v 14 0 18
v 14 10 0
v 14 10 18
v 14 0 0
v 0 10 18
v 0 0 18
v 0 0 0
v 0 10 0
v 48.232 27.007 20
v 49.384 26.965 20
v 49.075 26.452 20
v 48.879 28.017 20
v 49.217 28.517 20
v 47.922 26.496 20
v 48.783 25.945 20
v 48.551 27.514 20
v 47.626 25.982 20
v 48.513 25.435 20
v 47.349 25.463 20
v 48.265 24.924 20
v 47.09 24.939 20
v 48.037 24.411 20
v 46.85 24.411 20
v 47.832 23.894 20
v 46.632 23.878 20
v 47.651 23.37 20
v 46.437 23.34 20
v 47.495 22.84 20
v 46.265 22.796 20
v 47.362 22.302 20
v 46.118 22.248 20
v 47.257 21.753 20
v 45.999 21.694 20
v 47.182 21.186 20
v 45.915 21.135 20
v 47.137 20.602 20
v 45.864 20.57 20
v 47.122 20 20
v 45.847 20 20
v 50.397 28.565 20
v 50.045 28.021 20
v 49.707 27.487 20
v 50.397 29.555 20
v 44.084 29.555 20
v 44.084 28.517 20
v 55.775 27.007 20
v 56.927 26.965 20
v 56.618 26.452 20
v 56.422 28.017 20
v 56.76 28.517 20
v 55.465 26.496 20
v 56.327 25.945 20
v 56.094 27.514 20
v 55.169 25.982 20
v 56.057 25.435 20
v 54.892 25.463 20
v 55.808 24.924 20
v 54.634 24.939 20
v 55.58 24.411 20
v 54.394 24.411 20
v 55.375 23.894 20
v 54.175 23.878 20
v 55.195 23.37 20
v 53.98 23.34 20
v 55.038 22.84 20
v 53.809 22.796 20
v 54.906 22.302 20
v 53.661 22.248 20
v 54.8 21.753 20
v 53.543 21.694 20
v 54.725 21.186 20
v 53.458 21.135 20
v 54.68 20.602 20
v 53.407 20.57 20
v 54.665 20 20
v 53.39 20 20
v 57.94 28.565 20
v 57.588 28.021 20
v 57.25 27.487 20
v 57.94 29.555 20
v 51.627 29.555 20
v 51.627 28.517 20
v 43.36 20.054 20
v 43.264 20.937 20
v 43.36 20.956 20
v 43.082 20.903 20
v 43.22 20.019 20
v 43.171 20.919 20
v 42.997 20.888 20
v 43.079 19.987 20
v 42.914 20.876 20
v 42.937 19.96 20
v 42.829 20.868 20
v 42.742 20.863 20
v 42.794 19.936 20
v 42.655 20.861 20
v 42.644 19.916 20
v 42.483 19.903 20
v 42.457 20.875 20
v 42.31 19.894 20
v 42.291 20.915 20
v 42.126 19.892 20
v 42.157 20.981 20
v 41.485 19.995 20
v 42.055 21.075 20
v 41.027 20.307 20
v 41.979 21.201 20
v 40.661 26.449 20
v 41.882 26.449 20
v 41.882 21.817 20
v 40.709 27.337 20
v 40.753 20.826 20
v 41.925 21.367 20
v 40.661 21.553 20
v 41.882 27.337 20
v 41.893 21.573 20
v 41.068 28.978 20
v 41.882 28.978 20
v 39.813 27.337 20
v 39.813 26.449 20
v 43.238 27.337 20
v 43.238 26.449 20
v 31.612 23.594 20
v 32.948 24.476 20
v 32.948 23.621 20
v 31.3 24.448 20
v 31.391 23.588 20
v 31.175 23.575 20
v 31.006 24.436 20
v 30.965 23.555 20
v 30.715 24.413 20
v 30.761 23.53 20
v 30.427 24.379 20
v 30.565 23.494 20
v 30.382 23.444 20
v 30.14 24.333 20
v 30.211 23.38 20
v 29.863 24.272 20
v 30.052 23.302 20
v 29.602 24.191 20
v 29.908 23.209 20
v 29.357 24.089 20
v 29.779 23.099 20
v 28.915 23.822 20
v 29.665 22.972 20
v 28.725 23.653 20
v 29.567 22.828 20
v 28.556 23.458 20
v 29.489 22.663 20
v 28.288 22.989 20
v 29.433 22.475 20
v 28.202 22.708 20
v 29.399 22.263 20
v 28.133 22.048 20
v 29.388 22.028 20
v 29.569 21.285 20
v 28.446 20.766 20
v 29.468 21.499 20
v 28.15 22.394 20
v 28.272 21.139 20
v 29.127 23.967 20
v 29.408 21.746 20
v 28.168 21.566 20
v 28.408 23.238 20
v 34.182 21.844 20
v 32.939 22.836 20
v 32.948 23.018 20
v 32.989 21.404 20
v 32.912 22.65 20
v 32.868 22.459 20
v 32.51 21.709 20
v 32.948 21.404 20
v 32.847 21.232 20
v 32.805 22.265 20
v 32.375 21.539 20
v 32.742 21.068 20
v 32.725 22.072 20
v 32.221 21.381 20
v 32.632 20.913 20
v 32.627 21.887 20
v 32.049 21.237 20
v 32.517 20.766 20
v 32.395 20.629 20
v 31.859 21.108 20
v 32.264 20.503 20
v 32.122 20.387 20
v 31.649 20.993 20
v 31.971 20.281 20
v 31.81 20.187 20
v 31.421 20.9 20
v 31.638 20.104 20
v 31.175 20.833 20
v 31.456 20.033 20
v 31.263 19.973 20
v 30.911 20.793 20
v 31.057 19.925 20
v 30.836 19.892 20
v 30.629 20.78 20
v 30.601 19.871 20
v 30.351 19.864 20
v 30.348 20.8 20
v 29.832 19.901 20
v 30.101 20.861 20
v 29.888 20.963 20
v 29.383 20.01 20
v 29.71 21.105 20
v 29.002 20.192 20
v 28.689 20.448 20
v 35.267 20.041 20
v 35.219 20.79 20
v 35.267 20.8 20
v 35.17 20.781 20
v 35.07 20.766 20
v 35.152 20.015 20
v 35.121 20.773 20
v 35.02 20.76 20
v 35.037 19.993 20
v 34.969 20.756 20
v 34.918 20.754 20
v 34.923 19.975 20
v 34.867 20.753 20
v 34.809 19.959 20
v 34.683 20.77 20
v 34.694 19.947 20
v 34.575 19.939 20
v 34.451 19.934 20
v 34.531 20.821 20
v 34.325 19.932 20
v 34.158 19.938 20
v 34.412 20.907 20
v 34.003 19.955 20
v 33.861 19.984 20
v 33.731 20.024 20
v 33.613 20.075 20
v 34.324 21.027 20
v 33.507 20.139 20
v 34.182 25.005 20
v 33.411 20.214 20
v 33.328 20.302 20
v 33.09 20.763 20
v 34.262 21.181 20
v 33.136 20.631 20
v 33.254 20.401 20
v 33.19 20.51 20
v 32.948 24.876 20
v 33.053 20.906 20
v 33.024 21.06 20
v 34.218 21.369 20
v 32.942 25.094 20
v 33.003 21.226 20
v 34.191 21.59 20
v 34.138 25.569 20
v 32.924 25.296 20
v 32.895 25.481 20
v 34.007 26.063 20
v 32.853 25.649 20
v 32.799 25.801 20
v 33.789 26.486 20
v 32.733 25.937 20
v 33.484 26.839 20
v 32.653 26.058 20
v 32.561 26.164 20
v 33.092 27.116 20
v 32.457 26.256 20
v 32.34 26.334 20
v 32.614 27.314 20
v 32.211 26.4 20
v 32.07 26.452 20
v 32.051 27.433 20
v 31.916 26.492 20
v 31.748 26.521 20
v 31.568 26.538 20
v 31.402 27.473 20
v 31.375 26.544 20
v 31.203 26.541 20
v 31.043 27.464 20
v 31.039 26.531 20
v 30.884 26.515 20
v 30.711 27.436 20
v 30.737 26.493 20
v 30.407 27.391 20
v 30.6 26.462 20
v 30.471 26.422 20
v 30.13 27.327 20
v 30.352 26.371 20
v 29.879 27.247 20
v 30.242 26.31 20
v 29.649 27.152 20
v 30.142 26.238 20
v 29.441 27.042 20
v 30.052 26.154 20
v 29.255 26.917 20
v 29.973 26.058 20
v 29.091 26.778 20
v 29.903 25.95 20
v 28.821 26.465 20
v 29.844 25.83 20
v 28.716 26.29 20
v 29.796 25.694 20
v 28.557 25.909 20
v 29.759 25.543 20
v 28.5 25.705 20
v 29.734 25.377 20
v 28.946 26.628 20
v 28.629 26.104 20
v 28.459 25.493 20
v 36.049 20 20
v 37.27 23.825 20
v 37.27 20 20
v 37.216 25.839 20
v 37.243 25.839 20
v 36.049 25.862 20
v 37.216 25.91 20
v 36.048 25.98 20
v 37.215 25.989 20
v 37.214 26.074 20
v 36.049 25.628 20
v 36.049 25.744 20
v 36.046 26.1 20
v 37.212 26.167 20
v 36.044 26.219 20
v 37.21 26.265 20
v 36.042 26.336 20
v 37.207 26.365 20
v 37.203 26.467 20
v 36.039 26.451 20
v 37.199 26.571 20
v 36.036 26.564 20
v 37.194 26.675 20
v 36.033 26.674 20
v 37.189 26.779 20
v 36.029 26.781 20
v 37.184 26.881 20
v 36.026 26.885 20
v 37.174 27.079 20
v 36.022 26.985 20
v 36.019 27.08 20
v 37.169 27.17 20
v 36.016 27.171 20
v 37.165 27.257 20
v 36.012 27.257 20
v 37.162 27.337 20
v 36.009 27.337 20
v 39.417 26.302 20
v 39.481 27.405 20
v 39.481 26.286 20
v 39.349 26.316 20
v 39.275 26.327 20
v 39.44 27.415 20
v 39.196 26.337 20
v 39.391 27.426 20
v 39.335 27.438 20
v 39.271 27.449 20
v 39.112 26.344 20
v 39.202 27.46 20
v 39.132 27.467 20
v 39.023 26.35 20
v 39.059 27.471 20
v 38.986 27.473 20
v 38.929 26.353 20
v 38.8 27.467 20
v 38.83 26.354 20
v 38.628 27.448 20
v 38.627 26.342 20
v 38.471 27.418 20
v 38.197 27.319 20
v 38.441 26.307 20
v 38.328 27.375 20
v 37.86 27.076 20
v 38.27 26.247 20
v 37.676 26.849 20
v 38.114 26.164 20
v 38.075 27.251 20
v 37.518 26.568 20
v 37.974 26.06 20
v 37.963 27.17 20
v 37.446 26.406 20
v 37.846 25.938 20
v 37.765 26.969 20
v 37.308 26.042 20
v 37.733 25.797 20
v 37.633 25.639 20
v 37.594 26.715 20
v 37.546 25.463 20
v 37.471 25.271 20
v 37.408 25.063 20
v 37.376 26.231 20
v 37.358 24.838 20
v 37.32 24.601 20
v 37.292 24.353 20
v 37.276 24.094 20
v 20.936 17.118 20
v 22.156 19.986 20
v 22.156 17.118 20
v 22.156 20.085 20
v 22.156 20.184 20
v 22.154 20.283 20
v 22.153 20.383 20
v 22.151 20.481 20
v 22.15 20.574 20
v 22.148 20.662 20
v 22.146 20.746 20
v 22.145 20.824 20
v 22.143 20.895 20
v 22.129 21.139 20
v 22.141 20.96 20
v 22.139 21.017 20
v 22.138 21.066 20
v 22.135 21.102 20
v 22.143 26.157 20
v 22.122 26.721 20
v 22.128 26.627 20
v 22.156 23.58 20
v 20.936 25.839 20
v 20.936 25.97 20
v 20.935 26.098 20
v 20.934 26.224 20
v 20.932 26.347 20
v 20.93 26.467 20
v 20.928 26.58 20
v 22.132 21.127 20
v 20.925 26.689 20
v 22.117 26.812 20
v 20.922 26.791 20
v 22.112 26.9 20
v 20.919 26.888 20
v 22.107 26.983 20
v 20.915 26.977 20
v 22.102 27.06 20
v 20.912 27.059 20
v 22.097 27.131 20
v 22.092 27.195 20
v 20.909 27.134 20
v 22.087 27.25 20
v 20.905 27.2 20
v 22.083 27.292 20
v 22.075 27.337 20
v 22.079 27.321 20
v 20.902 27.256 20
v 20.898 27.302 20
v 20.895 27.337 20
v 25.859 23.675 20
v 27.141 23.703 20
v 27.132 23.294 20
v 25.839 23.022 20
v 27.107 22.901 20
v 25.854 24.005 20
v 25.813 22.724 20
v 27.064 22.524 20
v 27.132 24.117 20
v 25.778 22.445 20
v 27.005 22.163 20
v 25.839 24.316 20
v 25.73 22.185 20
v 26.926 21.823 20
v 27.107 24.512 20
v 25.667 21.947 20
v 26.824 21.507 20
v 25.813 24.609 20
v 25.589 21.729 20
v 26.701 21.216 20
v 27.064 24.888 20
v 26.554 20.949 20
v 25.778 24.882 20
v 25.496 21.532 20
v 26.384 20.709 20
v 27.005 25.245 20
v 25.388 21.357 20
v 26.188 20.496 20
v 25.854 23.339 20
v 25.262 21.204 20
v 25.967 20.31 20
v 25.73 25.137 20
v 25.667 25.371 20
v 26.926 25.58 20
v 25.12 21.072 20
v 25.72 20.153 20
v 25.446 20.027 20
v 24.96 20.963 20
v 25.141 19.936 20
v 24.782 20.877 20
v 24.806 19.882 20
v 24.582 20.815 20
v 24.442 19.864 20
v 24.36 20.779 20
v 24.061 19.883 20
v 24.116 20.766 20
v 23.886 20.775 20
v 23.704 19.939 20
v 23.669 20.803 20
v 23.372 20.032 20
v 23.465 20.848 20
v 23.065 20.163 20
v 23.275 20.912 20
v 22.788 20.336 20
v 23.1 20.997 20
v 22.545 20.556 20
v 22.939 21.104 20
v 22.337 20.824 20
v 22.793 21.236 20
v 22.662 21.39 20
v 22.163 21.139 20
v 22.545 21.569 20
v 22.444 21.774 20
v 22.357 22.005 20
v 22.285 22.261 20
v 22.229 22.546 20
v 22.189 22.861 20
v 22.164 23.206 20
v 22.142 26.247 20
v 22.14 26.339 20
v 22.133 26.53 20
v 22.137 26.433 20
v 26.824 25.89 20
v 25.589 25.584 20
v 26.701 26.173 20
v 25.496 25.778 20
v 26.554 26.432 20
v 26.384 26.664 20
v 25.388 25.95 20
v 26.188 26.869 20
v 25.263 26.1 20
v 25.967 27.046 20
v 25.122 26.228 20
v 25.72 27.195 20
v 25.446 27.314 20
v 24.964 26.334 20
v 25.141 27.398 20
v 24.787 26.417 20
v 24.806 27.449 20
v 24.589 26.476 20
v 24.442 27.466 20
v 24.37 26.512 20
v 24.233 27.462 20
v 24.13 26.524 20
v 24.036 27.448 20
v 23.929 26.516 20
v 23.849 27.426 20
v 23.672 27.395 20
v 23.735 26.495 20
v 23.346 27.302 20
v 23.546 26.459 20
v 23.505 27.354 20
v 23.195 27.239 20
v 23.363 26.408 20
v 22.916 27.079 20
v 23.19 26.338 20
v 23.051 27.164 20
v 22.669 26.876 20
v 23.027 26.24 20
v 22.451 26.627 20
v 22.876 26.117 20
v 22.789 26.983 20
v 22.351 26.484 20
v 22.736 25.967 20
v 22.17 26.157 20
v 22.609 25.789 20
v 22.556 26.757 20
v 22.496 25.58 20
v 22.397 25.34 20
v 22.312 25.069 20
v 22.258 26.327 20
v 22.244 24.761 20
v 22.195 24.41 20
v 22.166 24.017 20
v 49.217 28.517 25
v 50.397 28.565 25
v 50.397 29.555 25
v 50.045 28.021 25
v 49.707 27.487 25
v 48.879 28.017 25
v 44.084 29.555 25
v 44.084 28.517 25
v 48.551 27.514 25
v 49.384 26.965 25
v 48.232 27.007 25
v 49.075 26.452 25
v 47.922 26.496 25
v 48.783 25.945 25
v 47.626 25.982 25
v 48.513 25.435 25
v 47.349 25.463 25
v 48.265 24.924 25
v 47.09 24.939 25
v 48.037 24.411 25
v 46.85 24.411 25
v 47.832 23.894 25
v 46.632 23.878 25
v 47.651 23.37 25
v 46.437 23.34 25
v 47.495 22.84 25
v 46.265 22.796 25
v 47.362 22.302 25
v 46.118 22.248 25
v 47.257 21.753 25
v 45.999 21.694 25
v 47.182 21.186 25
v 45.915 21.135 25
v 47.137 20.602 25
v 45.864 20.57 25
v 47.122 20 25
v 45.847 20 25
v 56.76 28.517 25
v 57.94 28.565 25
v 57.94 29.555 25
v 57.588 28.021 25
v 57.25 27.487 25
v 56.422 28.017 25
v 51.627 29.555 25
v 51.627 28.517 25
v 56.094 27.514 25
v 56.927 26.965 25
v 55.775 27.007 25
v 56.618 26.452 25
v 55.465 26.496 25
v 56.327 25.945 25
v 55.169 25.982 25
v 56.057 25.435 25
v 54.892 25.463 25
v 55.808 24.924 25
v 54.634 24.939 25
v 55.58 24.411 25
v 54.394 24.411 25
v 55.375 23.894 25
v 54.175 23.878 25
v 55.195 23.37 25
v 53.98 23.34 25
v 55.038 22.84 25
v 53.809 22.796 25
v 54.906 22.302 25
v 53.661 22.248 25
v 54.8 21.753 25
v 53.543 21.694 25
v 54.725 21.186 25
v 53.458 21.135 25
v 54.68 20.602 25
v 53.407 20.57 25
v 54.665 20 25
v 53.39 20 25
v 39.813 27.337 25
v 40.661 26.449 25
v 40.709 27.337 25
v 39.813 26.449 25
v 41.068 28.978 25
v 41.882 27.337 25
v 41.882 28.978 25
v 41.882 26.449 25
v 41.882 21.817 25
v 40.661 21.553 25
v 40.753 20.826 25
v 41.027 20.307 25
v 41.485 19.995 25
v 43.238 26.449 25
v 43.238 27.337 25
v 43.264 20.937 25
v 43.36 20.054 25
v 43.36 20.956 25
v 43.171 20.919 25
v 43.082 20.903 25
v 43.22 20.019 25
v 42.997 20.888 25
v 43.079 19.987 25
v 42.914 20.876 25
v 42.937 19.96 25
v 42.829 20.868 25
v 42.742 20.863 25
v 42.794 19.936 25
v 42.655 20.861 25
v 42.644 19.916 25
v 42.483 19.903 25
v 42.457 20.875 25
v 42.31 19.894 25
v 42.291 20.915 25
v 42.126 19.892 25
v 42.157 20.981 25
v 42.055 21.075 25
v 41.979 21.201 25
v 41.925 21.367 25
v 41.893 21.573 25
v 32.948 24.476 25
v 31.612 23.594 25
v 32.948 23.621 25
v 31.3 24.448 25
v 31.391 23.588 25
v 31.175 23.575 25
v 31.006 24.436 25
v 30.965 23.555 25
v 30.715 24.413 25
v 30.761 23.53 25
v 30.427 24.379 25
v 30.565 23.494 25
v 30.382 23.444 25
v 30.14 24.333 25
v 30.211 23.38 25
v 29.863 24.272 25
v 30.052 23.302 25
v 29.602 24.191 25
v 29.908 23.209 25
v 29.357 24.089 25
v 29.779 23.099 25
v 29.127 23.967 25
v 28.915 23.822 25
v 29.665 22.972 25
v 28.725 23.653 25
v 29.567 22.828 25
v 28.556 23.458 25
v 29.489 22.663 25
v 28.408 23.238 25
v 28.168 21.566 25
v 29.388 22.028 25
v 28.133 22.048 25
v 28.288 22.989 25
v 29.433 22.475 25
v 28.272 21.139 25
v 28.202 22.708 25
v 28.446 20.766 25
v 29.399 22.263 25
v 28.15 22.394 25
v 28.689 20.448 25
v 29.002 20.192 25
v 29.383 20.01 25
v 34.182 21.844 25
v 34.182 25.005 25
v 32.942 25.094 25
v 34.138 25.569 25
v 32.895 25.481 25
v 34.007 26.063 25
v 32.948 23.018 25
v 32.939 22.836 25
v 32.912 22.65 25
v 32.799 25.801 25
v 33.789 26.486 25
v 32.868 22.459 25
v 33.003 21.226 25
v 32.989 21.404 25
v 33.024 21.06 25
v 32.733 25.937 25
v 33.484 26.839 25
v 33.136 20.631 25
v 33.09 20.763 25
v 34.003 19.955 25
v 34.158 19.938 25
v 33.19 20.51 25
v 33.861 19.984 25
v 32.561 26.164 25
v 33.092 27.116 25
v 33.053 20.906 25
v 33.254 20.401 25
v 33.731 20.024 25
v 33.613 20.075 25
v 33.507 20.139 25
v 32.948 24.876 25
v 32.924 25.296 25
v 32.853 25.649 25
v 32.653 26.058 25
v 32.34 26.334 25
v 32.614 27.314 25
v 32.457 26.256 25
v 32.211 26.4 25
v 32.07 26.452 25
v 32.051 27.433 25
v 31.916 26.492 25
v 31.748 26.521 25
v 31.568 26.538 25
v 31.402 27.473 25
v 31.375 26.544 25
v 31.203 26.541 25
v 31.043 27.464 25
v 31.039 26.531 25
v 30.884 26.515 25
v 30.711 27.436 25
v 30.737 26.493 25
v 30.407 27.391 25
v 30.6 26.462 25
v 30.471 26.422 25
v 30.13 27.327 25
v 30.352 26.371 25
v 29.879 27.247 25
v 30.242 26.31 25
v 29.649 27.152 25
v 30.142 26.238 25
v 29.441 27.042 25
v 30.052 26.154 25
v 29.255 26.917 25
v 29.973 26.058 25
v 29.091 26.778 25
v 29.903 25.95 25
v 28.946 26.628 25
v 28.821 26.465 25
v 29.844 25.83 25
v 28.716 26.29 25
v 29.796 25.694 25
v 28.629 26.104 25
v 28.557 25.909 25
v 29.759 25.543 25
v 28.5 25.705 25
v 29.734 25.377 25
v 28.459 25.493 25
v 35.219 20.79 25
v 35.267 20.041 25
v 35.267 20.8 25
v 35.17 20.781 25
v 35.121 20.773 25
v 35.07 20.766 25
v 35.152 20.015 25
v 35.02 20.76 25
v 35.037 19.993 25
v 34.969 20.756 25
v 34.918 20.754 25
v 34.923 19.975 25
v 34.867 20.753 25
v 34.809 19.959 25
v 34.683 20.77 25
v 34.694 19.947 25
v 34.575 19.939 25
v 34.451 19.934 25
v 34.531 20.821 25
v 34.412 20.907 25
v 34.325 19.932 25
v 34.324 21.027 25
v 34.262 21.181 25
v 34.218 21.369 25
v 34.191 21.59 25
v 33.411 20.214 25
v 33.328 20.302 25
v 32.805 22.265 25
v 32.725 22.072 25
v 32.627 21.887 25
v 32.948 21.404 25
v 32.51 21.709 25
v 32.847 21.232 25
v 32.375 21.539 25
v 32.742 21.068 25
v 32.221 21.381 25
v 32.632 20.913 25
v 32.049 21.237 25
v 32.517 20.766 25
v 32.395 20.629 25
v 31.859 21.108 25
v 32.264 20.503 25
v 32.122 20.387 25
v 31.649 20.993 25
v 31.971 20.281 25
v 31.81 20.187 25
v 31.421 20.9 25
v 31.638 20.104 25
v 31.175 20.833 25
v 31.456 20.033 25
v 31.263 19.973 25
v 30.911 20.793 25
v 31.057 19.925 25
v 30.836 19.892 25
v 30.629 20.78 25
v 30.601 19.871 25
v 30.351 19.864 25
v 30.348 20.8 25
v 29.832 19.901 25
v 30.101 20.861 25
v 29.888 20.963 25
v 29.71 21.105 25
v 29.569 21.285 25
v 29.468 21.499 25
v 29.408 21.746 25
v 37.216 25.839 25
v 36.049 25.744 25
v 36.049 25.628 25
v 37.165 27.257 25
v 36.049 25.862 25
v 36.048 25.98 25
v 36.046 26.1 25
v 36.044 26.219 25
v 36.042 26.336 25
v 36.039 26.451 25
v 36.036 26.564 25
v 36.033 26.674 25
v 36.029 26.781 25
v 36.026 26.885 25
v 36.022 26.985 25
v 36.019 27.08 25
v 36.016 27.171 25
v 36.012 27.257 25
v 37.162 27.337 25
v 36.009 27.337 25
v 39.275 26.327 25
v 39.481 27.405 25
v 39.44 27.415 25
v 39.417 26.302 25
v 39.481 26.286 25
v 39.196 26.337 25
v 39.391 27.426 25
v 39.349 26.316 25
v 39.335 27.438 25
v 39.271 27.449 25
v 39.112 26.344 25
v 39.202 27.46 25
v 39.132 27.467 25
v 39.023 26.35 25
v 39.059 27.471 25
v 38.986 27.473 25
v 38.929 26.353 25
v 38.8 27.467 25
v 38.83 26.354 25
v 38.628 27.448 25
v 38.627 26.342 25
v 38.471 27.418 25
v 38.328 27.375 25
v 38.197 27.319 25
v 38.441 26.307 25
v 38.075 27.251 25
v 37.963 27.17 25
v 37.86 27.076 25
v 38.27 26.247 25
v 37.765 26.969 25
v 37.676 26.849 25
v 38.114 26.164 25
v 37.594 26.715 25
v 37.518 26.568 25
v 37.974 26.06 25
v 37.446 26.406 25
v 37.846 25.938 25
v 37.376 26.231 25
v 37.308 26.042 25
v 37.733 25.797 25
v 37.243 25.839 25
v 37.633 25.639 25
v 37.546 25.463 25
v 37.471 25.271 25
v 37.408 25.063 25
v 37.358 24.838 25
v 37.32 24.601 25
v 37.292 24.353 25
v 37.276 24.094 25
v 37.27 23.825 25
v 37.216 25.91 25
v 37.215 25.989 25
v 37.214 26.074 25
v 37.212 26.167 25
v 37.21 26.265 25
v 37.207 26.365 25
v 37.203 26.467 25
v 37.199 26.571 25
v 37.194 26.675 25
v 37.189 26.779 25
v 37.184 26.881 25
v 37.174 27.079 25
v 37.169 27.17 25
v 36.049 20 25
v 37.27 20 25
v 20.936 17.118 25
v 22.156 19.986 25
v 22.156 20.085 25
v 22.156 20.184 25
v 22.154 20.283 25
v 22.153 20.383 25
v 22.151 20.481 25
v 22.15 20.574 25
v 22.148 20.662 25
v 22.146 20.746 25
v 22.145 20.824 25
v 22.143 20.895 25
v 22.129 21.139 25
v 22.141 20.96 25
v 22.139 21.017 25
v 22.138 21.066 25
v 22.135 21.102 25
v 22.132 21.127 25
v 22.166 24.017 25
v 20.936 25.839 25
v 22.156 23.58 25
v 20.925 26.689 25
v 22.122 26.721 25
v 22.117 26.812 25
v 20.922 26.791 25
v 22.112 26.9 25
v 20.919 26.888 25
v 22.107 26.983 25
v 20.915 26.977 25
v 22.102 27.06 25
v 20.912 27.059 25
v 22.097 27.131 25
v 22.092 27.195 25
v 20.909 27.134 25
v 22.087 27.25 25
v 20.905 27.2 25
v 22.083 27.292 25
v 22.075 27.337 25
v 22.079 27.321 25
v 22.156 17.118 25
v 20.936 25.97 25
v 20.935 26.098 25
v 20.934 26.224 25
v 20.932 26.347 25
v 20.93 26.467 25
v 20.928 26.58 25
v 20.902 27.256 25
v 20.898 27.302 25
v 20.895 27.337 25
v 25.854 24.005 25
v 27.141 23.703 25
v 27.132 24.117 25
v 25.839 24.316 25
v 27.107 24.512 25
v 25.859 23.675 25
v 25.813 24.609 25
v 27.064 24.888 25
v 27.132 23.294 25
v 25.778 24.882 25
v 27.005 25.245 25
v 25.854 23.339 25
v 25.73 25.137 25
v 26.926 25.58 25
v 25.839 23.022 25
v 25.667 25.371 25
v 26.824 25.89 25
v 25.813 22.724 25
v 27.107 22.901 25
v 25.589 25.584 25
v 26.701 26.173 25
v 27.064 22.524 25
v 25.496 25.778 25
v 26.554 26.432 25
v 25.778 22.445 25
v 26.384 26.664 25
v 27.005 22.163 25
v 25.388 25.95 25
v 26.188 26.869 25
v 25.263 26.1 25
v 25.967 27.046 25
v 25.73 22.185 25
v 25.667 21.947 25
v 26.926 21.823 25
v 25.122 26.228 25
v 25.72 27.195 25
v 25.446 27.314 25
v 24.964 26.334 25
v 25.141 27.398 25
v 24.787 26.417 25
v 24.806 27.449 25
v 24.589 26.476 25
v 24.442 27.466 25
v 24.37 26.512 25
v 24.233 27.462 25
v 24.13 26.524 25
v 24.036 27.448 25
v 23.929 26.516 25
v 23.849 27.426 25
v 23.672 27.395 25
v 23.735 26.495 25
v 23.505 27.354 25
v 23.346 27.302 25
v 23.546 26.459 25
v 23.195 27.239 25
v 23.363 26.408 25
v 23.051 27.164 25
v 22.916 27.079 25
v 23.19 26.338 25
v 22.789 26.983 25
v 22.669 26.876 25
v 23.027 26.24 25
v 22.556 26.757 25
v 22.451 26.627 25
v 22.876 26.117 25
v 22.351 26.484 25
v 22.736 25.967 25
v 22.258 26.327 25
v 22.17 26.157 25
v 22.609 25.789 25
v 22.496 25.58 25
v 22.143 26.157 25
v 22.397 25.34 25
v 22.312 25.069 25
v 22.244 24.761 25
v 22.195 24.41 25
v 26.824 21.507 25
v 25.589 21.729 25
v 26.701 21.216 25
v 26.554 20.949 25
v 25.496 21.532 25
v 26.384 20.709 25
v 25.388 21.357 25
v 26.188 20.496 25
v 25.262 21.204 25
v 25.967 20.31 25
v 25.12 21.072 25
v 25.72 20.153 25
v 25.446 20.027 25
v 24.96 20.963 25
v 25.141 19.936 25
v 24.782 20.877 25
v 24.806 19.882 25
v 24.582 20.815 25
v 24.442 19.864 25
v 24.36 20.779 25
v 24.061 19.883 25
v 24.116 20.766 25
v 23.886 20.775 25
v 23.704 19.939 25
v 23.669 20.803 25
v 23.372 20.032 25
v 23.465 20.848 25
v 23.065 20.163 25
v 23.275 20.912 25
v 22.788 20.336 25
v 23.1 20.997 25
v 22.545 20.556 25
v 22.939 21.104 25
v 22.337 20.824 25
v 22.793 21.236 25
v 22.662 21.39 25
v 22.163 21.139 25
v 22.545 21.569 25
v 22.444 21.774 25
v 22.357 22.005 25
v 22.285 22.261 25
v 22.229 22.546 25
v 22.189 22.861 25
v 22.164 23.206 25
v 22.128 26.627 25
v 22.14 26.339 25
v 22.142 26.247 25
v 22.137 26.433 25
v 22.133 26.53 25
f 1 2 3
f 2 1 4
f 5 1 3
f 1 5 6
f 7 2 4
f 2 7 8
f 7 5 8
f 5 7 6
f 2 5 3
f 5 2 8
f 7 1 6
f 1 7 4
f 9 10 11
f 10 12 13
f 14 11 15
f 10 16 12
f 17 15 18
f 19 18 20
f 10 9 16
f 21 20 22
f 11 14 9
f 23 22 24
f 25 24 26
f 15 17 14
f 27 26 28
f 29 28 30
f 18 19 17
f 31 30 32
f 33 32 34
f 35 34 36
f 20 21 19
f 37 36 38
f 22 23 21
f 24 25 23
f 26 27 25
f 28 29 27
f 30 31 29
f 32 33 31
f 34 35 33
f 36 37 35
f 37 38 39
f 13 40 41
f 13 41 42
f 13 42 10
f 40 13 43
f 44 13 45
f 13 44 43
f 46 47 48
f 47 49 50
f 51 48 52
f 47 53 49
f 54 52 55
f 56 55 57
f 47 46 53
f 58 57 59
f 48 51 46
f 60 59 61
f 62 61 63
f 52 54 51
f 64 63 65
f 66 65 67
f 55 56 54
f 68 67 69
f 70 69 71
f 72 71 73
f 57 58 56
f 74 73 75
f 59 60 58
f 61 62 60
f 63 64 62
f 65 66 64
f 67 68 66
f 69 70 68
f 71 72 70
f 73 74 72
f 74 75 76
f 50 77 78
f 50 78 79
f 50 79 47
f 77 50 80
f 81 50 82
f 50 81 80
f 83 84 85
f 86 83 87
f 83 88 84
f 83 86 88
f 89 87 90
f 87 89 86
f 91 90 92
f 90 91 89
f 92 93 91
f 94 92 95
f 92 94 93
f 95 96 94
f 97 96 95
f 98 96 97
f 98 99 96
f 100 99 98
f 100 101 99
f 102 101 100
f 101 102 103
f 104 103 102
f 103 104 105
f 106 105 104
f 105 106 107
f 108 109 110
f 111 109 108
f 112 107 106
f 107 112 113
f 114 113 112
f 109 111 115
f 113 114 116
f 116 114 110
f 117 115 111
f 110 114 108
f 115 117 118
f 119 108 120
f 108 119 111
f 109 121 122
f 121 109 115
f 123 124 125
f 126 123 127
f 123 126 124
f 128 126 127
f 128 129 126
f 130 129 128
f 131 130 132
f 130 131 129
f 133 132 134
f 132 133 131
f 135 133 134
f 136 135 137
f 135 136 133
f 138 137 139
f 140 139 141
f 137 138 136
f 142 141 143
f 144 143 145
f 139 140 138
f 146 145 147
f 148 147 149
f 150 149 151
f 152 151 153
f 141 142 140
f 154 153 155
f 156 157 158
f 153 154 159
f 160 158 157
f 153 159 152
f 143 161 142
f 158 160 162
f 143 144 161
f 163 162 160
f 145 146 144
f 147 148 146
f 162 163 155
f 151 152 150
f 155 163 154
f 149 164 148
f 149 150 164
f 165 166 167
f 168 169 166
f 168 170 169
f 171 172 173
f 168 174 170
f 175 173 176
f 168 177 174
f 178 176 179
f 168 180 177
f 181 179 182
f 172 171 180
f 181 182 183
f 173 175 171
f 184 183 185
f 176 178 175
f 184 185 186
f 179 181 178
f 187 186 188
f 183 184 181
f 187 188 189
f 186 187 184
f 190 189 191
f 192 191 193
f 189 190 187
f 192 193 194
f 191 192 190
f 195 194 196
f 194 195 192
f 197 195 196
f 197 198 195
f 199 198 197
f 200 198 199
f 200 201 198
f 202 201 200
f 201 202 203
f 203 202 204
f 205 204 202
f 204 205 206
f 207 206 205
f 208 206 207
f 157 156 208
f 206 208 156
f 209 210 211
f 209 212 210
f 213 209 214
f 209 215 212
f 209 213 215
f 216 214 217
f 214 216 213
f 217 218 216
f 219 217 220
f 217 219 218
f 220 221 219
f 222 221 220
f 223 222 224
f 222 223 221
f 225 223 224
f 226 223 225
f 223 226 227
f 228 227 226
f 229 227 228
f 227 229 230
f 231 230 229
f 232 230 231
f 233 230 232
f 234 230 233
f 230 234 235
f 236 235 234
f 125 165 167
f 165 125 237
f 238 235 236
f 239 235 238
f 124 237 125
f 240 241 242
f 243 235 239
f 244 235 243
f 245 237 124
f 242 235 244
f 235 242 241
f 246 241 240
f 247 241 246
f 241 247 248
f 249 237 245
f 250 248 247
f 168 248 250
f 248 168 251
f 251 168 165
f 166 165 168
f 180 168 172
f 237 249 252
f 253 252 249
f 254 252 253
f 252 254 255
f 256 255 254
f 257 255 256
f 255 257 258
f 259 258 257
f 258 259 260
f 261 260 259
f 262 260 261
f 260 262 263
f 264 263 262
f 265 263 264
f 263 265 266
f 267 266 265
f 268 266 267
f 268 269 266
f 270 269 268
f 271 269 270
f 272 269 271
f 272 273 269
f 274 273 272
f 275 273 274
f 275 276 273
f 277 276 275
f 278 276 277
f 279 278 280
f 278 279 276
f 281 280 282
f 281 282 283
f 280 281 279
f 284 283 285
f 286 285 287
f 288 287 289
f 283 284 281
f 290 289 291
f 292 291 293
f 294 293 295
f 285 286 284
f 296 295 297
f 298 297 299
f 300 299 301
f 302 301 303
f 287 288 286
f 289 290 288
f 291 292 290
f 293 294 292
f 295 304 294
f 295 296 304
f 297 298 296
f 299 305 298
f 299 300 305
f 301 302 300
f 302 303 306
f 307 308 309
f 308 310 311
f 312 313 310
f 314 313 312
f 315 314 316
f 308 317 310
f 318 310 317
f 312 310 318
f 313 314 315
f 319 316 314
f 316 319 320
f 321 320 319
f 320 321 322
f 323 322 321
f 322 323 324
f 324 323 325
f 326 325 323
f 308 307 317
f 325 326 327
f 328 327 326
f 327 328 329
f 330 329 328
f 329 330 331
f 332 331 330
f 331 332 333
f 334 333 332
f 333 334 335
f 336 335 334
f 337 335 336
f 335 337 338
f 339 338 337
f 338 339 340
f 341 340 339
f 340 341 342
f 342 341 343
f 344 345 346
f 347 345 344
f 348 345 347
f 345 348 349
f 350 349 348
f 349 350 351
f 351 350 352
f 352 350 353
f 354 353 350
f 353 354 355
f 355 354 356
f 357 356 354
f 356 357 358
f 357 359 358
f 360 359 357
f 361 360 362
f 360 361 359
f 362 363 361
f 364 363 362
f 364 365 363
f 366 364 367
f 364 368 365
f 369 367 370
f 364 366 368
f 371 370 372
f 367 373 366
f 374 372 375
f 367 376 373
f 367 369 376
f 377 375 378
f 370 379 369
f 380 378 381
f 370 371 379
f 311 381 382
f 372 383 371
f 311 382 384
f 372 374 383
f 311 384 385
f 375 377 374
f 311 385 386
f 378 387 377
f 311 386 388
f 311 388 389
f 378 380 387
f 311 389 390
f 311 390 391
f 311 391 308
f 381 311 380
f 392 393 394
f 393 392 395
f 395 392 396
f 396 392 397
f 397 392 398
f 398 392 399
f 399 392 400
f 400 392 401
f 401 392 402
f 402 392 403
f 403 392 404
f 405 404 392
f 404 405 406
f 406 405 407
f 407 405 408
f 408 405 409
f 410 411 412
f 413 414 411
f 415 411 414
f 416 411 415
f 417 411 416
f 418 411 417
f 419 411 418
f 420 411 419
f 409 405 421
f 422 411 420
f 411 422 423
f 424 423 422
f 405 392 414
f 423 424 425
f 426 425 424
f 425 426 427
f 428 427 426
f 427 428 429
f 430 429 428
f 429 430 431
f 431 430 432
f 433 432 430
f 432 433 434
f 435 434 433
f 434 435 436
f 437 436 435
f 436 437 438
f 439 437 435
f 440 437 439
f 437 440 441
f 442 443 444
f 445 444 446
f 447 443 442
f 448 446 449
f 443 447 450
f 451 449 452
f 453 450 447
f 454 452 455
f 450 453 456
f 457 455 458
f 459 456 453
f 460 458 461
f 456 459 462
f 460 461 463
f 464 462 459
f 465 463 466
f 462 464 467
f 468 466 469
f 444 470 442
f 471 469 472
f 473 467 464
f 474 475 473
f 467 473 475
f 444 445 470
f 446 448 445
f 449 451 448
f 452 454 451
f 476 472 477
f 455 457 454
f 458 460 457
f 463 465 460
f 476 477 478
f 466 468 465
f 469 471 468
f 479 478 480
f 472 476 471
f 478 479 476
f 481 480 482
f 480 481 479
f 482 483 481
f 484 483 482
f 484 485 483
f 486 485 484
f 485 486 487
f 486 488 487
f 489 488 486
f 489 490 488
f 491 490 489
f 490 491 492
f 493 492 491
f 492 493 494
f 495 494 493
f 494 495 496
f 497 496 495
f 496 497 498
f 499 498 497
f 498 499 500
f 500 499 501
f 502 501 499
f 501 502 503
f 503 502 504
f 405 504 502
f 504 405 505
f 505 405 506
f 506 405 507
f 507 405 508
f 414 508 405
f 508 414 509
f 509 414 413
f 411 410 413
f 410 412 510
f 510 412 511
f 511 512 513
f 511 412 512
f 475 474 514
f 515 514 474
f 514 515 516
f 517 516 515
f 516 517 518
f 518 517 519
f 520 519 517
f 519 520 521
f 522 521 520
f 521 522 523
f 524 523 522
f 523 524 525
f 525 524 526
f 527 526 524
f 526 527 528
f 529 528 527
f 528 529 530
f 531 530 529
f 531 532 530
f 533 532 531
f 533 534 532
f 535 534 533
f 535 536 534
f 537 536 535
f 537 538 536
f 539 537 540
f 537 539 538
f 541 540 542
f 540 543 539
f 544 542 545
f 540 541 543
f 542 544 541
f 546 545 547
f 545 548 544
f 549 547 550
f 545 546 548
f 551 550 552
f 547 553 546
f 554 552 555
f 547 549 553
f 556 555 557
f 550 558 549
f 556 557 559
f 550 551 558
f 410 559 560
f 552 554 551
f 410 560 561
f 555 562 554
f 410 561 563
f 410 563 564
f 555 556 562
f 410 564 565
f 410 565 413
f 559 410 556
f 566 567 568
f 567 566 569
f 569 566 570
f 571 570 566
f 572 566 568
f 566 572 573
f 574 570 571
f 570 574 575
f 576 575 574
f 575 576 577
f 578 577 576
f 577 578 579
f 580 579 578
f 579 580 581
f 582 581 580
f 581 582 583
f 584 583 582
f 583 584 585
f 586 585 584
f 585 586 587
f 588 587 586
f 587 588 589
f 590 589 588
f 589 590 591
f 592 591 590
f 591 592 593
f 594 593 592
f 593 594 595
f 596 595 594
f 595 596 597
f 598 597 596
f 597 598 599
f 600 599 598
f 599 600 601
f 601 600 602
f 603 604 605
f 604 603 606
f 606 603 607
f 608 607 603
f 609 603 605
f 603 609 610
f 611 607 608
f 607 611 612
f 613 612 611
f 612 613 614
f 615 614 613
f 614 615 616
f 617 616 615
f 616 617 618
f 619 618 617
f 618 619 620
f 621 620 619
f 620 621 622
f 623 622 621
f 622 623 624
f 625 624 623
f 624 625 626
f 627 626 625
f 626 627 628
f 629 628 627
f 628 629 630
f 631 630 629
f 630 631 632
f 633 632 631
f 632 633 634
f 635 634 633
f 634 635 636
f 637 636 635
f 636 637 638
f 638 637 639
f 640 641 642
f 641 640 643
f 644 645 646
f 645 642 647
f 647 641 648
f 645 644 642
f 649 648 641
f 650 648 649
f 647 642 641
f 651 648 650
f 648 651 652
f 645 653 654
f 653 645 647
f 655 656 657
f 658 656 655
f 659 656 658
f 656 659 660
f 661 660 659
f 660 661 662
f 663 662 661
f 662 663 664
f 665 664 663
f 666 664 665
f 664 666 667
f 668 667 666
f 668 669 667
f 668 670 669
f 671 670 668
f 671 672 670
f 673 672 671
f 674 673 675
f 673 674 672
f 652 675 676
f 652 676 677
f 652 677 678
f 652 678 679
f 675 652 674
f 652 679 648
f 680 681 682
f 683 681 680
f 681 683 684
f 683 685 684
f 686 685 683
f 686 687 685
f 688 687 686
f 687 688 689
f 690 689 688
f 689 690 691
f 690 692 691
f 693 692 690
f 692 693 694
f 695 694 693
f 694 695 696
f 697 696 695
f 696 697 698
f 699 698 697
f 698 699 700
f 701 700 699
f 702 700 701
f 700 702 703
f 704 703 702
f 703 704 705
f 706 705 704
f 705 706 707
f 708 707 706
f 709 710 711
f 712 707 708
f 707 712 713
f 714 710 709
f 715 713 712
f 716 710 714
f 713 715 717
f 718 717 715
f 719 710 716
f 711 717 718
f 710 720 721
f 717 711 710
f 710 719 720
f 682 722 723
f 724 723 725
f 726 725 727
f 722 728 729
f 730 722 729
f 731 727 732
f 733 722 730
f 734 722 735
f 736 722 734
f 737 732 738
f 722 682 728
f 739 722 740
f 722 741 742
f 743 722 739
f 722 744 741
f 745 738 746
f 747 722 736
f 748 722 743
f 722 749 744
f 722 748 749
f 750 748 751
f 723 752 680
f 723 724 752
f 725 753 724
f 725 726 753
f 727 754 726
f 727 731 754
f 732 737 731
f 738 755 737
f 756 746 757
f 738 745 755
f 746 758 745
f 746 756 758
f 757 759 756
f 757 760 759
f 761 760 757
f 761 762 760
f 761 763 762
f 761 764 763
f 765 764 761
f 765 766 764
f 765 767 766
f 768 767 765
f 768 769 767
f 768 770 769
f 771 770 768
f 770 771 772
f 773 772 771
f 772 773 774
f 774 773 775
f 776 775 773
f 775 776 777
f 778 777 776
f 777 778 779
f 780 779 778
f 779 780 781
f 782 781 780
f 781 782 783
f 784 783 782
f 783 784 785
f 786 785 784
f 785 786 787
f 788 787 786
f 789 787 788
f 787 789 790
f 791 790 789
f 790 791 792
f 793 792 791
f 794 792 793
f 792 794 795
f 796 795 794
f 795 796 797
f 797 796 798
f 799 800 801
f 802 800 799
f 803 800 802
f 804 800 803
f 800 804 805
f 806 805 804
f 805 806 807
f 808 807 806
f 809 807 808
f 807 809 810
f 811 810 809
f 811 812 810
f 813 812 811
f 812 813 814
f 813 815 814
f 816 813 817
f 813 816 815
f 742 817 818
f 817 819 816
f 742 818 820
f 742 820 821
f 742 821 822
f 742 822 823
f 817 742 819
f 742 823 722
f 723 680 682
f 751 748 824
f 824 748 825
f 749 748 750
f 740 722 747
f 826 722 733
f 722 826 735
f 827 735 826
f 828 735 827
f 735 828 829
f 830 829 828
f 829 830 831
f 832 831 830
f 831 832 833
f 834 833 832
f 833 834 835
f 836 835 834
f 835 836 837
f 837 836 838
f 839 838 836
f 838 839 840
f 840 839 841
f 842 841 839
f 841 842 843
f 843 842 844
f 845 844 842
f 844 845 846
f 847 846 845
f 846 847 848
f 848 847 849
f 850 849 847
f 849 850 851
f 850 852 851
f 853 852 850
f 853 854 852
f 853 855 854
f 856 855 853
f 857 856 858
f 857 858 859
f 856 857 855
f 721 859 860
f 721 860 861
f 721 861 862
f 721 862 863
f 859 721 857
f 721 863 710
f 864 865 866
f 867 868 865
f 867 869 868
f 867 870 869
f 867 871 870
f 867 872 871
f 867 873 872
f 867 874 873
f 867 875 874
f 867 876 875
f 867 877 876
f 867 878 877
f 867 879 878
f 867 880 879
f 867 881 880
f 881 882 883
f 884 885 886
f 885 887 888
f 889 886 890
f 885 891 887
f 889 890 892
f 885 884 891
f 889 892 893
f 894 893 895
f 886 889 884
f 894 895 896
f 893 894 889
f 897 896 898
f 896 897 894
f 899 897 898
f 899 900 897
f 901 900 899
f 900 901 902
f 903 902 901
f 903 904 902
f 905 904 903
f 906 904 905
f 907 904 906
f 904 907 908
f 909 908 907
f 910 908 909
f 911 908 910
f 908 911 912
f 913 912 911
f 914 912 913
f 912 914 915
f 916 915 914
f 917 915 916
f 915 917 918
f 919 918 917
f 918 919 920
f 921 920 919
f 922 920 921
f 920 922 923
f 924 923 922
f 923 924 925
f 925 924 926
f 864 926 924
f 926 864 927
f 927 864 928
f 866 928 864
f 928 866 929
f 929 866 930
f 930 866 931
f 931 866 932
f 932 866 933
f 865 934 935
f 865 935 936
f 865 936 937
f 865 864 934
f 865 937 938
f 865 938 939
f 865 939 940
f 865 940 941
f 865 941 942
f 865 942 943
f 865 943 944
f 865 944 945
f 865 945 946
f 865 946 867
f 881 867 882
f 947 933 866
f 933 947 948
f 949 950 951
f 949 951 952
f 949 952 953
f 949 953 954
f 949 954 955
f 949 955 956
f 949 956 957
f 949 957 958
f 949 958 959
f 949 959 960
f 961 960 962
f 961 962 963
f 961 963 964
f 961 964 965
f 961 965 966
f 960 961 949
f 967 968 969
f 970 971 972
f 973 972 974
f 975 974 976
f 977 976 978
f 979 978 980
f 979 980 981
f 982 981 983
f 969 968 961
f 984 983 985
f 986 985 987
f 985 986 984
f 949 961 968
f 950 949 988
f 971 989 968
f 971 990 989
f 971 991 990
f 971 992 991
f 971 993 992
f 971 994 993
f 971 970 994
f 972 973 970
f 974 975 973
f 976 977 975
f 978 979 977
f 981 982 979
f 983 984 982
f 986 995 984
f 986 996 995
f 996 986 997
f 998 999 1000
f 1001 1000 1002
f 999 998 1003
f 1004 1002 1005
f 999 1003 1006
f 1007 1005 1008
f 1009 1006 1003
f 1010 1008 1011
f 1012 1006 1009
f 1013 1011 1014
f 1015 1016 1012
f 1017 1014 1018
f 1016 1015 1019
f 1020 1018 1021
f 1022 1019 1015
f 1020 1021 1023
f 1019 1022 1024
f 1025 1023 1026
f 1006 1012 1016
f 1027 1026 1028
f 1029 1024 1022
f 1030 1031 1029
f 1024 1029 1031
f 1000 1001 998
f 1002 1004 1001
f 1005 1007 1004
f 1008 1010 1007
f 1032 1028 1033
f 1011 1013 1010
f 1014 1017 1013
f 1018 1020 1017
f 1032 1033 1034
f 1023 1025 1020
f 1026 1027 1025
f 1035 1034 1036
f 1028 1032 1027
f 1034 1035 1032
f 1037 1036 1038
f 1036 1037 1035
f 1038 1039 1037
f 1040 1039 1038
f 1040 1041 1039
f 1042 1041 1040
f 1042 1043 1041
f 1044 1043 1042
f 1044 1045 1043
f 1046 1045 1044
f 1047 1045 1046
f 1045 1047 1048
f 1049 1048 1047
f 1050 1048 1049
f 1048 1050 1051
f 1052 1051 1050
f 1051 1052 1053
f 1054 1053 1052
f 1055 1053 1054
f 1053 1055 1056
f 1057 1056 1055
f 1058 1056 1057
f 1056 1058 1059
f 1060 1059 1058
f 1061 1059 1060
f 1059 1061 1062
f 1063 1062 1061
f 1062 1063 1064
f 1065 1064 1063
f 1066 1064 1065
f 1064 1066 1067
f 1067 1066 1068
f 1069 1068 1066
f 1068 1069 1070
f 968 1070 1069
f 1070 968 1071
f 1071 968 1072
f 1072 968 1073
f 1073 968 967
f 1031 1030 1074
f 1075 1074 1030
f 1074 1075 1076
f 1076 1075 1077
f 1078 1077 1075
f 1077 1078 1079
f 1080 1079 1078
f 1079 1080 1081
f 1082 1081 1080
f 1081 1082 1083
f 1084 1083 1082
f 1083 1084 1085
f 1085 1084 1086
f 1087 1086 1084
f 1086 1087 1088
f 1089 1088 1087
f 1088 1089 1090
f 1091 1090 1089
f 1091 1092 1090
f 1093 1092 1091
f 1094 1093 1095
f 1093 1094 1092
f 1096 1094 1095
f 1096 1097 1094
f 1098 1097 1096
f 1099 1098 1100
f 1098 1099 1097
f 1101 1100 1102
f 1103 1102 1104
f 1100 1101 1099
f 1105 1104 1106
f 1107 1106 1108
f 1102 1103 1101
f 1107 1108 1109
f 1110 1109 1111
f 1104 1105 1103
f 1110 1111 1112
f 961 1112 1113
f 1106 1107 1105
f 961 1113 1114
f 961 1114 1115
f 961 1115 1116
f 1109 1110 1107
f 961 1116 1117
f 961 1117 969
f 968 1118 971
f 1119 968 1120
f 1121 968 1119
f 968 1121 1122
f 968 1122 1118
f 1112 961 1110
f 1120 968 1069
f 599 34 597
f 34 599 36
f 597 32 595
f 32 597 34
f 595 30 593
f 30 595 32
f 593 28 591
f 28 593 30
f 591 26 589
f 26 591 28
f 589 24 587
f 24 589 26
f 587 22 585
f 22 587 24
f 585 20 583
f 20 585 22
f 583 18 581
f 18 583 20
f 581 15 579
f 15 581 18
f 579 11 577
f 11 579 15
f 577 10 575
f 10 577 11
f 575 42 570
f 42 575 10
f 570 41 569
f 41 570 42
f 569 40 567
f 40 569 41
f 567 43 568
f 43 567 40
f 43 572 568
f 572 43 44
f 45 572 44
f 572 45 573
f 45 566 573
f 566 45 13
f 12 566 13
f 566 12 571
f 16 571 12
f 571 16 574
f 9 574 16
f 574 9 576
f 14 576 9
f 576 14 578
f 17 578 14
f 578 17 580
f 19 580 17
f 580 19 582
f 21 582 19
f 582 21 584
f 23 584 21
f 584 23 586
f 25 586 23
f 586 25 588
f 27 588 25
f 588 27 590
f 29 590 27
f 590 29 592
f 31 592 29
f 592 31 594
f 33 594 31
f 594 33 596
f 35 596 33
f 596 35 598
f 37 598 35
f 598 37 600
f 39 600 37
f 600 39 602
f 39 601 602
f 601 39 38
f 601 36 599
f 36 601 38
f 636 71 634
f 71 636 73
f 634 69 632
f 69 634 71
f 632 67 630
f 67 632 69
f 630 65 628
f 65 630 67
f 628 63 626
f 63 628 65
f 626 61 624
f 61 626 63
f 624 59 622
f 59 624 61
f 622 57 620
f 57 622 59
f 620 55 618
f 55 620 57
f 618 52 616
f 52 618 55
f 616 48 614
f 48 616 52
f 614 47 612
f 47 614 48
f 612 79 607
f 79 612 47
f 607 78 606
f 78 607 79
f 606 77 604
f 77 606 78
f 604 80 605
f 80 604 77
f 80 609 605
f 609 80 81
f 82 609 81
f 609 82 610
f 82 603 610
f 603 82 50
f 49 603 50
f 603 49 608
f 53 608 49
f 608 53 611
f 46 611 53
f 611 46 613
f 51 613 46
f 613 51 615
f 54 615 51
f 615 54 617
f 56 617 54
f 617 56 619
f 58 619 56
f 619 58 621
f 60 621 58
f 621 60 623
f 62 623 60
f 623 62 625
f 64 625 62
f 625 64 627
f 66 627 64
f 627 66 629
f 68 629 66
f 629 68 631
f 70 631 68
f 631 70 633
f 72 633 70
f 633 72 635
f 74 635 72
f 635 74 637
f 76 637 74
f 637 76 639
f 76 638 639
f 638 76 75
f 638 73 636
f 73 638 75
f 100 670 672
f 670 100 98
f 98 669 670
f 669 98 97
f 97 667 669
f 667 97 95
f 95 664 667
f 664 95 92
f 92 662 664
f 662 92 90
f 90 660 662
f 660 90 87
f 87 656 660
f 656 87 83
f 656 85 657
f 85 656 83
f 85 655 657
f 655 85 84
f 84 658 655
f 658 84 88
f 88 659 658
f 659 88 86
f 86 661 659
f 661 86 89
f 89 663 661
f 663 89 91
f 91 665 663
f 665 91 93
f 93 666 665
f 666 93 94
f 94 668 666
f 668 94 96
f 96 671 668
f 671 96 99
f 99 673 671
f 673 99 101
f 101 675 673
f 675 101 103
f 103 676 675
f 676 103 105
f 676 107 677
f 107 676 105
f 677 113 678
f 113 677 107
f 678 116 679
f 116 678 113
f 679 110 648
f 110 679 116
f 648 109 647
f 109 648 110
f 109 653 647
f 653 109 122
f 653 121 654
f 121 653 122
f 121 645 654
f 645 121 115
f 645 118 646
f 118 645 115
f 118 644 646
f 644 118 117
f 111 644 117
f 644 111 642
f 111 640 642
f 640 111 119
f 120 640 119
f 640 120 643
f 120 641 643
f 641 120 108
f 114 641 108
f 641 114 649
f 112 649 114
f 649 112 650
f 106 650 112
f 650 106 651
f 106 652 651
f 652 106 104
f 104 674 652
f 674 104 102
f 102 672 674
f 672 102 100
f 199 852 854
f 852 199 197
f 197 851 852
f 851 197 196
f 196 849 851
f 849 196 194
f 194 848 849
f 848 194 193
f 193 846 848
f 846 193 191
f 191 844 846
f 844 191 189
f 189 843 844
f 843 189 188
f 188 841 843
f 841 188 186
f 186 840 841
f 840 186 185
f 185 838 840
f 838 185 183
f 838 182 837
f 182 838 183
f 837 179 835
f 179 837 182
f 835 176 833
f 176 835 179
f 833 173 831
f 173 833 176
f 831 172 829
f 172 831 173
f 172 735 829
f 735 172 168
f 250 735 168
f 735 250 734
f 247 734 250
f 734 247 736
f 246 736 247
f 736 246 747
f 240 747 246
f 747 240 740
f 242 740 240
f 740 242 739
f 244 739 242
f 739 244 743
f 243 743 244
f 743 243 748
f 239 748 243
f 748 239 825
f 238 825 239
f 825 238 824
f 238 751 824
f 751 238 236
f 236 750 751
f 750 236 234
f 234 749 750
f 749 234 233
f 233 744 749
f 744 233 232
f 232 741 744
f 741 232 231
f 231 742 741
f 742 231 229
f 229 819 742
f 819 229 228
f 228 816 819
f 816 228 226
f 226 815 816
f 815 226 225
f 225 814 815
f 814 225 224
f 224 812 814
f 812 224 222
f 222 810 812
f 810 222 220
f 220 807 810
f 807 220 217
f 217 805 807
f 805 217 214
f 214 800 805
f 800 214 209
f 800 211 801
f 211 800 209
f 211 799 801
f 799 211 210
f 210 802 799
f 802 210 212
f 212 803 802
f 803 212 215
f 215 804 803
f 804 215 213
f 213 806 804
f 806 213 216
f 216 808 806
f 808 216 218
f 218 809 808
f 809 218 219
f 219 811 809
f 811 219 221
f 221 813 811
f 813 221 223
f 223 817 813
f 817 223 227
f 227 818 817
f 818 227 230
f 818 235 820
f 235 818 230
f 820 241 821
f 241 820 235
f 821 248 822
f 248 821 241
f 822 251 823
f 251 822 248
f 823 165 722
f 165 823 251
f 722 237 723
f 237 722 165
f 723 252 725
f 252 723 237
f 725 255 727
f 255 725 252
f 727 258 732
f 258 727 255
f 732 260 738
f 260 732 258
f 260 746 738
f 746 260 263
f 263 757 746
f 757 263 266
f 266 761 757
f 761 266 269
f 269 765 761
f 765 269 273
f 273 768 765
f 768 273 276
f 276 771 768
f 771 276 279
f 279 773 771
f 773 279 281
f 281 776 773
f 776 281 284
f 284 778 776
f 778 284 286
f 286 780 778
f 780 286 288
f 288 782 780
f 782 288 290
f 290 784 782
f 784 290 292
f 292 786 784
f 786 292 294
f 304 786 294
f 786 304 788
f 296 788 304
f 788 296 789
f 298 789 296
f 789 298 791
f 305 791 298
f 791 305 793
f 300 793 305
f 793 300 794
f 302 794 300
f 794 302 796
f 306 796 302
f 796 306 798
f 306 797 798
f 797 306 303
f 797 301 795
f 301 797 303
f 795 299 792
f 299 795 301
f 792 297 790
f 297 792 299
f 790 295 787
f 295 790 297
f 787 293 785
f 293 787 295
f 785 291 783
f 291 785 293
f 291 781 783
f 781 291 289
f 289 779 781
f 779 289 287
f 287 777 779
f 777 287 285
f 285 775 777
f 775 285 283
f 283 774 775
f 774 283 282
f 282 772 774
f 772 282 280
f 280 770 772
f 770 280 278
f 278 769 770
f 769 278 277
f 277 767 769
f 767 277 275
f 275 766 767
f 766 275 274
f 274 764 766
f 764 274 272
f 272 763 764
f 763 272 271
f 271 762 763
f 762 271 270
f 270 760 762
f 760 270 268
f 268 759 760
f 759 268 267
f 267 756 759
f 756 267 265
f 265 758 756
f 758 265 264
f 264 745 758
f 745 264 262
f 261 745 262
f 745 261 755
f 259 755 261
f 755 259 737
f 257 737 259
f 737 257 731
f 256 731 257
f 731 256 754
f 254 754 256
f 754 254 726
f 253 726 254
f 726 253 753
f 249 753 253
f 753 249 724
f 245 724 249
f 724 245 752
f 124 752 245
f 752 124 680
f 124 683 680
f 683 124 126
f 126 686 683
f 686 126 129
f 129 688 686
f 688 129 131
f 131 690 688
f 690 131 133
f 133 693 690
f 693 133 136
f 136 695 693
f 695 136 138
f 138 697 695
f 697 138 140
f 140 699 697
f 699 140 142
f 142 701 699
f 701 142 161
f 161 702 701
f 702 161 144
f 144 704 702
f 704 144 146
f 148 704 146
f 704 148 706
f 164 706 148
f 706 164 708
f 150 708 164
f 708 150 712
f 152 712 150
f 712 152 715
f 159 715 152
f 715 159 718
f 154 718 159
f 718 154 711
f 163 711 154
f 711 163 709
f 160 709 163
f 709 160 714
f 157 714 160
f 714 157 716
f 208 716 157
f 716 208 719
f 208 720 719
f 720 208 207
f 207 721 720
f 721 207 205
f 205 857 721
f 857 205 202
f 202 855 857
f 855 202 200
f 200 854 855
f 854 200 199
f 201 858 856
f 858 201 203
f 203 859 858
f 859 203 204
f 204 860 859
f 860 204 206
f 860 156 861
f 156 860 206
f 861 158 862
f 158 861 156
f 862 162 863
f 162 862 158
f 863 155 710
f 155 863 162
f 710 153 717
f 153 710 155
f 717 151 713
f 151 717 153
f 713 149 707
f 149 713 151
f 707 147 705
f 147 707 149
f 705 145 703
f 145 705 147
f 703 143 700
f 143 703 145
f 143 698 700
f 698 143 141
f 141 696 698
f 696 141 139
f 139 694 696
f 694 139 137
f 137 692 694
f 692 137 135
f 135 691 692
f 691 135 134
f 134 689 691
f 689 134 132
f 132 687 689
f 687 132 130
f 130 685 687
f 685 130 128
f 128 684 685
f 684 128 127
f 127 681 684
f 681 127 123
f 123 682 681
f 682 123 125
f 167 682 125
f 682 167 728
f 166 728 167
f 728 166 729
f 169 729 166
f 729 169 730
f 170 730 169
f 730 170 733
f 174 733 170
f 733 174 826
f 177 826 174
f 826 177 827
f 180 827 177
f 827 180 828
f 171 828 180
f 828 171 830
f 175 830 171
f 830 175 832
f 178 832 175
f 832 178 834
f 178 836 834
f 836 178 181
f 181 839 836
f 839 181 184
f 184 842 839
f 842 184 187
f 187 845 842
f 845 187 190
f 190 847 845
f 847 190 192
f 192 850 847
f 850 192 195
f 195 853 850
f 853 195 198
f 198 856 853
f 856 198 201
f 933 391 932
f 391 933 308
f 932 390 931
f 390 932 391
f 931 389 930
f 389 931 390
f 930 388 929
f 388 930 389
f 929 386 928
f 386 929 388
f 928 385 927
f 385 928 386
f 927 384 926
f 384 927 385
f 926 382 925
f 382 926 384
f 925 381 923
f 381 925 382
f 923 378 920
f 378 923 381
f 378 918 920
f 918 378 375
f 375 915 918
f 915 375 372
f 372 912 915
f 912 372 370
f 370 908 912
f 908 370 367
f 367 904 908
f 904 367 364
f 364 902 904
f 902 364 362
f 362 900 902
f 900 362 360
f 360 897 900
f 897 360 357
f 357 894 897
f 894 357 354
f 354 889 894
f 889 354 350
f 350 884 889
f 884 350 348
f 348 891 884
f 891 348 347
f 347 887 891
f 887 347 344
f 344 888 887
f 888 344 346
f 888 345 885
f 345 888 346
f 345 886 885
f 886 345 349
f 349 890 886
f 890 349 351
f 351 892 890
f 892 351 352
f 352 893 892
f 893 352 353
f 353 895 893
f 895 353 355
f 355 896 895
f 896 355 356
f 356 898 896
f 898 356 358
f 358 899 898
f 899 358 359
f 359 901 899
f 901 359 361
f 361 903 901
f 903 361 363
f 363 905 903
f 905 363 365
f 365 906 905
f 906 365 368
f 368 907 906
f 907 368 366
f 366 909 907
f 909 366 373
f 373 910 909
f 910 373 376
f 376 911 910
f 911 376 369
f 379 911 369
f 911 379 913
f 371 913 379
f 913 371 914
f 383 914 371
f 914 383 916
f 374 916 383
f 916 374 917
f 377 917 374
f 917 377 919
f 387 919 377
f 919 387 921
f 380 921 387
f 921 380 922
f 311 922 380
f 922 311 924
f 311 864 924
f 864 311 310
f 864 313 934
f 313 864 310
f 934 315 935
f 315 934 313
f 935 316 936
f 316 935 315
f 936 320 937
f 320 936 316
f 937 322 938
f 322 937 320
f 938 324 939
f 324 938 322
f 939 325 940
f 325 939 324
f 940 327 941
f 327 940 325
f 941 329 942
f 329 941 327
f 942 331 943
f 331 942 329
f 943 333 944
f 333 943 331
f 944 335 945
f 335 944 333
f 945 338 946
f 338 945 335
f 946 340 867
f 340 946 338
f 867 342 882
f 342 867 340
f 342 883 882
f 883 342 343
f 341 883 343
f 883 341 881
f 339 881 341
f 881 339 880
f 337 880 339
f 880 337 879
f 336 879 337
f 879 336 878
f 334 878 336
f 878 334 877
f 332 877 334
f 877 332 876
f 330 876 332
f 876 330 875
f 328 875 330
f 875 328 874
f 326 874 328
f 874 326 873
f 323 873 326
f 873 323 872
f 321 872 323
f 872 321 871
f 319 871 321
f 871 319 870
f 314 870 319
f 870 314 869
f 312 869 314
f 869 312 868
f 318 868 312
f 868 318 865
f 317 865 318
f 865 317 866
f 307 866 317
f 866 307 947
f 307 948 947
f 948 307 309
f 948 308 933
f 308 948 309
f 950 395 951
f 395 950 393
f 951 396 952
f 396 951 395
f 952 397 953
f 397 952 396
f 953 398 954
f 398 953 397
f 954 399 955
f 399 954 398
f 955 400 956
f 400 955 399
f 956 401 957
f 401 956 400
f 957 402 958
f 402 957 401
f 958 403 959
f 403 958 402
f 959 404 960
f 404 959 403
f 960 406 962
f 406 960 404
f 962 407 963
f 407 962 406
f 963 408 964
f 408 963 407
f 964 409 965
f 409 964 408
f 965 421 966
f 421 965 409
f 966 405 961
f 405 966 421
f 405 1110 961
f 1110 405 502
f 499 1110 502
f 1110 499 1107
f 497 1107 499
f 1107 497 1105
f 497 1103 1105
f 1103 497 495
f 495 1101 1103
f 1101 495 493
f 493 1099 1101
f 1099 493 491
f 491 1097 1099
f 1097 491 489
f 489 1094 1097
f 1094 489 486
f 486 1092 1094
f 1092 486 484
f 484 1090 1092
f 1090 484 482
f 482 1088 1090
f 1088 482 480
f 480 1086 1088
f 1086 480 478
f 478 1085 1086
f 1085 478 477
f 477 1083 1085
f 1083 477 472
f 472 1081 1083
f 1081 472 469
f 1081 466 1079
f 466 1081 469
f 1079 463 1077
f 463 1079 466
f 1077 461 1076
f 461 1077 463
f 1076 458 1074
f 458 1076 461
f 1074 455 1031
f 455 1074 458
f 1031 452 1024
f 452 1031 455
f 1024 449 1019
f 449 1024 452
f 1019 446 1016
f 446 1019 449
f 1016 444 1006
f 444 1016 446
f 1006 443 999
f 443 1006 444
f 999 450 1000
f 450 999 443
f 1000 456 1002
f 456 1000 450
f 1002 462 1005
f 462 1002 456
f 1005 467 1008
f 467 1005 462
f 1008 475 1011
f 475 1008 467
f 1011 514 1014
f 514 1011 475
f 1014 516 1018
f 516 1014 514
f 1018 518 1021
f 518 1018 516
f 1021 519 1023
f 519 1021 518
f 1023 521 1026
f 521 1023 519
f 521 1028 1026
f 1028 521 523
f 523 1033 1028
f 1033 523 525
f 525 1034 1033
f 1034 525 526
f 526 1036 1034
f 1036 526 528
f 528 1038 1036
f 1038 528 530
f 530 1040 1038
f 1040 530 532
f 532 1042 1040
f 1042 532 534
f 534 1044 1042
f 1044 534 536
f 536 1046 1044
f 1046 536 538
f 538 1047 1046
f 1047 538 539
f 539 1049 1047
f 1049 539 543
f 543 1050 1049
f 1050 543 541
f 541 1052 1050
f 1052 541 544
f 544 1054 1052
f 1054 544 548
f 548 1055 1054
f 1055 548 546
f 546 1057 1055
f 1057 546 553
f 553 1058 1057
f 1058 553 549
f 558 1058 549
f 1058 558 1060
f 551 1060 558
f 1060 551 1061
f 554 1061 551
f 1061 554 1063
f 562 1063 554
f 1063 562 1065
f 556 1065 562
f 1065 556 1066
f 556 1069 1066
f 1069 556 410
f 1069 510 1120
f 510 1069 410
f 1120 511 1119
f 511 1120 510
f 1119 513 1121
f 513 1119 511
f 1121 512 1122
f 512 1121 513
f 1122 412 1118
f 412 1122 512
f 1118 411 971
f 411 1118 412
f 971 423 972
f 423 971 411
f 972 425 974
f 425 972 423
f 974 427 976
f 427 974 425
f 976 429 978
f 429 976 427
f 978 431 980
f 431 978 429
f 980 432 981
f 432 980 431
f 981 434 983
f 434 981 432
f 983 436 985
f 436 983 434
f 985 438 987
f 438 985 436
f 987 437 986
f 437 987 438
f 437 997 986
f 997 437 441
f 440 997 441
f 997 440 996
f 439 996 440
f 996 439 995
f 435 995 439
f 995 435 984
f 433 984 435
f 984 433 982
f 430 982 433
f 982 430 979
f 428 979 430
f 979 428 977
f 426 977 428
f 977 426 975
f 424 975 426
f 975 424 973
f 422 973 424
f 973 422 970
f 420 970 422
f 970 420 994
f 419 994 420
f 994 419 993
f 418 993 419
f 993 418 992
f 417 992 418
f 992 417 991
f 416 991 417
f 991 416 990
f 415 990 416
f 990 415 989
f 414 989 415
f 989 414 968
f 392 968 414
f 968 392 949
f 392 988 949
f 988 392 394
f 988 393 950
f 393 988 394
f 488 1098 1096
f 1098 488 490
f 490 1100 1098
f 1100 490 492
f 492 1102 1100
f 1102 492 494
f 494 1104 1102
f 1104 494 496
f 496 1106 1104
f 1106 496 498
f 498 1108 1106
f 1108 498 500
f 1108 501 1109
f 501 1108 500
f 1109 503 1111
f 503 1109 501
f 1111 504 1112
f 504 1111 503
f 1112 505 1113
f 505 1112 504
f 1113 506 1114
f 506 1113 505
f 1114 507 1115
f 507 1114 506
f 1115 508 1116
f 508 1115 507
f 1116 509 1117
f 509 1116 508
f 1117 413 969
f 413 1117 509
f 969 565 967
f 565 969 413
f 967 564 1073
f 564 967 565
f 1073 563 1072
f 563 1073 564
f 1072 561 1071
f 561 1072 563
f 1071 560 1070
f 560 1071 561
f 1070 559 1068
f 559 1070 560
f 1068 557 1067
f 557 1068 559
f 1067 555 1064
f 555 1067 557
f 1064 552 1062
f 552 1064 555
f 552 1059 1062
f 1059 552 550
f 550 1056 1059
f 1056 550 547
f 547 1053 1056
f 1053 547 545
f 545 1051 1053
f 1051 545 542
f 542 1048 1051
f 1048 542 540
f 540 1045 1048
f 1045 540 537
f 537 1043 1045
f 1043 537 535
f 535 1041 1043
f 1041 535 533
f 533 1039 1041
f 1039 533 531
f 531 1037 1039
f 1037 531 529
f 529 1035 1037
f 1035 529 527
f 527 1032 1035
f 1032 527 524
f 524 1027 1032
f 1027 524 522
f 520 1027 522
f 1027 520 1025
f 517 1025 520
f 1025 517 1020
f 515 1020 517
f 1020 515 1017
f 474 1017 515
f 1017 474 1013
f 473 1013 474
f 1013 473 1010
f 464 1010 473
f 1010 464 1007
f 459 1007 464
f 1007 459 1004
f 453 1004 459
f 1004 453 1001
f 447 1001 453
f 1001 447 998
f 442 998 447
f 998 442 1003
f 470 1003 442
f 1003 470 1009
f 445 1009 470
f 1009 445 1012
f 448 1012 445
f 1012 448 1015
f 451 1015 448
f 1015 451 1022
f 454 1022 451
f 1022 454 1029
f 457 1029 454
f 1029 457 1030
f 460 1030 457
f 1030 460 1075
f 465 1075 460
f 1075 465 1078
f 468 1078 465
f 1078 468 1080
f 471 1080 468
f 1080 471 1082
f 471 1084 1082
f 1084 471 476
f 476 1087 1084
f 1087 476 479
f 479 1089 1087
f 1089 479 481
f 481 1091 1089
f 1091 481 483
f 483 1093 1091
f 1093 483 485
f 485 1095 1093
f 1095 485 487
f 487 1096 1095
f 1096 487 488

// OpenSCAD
//[CUSTOMIZATION]
// X Dimension
xdim=14;
// Y Dimension
ydim=10;
// Z Dimension
zdim=18;
// Message
txt="part77";
// I love it
boolvar=true;
module __END_CUSTOMIZATIONS () {}
cube([xdim,ydim,zdim]);
translate([20,20,20]) { linear_extrude(5) text(txt, font="Liberation Sans"); }
